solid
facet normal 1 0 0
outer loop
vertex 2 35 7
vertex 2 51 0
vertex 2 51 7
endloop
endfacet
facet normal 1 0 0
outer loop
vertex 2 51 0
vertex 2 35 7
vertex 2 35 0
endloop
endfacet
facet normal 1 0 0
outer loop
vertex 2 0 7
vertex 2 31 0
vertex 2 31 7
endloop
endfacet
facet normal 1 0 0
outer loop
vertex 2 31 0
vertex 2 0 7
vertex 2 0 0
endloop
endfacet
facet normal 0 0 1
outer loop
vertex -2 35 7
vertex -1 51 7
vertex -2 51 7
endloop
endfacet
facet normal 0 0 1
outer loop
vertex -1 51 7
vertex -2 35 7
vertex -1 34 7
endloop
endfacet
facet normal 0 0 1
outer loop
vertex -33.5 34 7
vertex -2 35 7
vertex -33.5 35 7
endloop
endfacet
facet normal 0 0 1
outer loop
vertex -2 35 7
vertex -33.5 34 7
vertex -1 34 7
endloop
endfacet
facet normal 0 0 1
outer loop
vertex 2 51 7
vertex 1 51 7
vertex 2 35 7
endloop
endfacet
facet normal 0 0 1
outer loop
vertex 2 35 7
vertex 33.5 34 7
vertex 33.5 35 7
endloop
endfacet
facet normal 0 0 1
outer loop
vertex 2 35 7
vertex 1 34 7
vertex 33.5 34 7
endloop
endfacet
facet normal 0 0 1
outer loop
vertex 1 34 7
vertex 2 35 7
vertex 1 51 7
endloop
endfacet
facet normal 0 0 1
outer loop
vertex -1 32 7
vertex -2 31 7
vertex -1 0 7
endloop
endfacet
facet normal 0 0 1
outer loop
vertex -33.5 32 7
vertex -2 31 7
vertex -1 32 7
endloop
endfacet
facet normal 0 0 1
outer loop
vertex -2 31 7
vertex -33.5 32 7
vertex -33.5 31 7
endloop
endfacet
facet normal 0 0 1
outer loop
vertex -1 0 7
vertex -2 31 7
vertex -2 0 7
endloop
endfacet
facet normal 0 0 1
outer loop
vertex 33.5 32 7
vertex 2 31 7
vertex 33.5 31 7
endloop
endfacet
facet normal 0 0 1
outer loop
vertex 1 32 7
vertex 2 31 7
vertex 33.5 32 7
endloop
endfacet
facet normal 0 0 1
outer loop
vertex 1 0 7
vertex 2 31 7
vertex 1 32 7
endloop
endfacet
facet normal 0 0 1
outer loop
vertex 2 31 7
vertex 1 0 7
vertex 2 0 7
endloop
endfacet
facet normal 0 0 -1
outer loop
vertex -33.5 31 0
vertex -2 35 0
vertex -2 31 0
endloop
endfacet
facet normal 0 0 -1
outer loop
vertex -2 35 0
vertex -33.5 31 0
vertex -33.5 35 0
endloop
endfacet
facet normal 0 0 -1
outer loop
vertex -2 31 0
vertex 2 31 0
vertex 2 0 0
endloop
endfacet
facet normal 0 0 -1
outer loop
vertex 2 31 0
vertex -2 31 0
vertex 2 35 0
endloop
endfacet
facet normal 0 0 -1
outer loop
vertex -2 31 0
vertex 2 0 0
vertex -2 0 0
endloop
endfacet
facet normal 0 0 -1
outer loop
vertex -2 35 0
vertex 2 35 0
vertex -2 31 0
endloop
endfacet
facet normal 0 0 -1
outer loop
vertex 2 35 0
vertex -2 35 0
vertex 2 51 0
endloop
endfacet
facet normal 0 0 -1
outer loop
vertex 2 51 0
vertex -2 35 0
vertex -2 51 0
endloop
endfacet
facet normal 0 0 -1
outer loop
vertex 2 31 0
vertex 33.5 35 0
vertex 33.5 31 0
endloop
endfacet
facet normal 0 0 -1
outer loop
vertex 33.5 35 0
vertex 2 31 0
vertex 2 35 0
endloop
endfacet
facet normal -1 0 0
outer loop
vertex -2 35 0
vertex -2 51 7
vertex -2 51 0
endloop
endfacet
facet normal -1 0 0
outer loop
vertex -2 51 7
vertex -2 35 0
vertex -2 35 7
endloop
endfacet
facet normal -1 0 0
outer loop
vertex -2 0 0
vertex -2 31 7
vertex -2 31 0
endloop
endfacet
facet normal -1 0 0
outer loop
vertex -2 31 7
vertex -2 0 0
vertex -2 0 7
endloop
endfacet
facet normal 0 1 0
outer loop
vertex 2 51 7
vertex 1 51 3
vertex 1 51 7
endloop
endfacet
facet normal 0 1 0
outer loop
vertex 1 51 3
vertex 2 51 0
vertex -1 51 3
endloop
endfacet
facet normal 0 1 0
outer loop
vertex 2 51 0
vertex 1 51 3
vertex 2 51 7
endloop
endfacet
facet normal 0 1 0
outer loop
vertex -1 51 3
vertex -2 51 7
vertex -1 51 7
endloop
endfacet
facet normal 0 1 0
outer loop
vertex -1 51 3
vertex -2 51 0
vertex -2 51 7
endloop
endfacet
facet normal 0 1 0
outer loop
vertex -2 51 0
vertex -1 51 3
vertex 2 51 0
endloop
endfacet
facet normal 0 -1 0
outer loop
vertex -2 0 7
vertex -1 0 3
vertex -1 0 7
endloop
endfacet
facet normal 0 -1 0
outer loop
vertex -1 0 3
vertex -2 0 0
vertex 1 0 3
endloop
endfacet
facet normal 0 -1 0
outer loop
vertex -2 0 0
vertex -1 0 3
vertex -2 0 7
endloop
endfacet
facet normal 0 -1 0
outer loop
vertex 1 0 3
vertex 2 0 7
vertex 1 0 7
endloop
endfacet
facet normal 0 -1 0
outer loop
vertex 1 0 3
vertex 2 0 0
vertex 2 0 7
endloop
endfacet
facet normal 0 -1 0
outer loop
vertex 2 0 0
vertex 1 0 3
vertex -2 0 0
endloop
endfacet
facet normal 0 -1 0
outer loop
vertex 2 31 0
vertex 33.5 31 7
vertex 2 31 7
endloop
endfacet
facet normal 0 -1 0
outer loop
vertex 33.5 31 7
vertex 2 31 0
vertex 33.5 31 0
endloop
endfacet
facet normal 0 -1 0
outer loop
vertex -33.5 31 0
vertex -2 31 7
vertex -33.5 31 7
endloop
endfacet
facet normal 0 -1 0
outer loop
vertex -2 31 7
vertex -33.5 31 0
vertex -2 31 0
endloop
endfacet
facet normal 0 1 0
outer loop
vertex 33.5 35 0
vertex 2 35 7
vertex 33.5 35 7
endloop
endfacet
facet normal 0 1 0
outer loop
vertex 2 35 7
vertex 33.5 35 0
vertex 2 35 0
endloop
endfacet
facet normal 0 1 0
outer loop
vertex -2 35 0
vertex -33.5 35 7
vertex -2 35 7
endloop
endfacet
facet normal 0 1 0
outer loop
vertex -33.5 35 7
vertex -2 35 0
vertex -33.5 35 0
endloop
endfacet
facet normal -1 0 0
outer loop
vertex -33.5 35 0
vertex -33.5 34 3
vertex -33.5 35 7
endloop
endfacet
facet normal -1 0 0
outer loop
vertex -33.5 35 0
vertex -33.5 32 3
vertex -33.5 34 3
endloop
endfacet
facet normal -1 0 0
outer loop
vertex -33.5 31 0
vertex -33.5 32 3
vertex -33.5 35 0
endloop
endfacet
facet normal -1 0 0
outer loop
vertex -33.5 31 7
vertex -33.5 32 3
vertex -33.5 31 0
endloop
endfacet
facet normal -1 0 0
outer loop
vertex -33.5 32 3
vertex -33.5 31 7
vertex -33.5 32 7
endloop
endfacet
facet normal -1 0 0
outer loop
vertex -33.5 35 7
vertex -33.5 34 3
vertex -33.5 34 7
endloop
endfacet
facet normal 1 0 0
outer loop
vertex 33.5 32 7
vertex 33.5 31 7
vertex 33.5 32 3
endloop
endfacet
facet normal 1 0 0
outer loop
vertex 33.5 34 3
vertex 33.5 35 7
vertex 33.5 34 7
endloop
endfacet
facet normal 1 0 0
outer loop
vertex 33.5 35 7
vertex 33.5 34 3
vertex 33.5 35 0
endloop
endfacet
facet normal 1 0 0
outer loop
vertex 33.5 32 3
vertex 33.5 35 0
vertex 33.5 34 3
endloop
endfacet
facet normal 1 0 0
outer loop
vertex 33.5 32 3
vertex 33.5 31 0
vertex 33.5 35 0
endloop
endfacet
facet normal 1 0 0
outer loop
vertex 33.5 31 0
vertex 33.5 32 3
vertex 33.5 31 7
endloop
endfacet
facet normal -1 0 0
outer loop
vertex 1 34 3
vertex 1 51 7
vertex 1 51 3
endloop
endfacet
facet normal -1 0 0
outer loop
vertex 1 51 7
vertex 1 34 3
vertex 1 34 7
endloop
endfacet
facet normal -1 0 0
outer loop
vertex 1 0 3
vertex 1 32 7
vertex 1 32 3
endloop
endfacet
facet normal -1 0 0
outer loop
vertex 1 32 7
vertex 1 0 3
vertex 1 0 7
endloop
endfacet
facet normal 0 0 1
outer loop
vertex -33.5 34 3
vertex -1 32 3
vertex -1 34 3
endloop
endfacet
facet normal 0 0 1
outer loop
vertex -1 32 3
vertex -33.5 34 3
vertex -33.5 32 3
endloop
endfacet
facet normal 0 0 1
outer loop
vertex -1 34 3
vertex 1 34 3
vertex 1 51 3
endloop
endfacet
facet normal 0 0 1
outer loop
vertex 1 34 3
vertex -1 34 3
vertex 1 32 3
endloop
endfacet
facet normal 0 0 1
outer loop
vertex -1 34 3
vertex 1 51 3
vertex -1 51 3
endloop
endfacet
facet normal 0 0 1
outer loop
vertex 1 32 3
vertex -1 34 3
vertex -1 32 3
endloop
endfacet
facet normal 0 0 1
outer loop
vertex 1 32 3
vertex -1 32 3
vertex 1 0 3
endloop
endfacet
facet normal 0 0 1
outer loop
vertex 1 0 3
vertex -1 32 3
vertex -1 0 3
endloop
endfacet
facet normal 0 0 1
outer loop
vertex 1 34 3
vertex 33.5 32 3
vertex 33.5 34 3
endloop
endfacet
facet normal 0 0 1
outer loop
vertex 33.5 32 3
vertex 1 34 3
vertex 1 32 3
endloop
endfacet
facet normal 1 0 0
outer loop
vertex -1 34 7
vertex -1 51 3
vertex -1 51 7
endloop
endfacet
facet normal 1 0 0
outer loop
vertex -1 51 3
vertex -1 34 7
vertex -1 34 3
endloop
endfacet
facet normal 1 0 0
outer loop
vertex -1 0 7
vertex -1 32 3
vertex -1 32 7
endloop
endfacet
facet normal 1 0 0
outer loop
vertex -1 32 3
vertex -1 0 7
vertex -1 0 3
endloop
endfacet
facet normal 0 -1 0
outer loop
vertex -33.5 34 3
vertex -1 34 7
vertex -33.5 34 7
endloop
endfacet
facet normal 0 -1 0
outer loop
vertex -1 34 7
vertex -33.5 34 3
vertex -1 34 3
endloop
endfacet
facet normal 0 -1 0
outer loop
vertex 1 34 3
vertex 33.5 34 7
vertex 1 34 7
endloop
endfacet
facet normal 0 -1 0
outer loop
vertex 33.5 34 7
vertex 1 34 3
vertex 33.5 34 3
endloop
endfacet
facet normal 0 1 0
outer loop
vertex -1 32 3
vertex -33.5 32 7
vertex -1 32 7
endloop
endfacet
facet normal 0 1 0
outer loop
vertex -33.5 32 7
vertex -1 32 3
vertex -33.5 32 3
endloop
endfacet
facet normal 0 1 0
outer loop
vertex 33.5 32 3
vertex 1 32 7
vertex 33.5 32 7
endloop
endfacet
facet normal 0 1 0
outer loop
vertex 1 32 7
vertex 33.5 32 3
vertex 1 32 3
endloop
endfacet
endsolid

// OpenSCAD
cutW=2;
cutH=4;
width=2*1+cutW;
height=3+cutH;

difference()
{
  union()
  {
    translate([-width/2, 0, 0])
      cube([width, 51, height]);
    translate([-67/2, 31+width, 0])
      rotate([0, 0, -90])
        cube([width, 67, height]);
  }
  translate([-cutW/2, 0, 3])
    cube([cutW, 51, cutH]);
  translate([-67/2, 31+1, 3])
    cube([67, cutW, cutH]);
}
